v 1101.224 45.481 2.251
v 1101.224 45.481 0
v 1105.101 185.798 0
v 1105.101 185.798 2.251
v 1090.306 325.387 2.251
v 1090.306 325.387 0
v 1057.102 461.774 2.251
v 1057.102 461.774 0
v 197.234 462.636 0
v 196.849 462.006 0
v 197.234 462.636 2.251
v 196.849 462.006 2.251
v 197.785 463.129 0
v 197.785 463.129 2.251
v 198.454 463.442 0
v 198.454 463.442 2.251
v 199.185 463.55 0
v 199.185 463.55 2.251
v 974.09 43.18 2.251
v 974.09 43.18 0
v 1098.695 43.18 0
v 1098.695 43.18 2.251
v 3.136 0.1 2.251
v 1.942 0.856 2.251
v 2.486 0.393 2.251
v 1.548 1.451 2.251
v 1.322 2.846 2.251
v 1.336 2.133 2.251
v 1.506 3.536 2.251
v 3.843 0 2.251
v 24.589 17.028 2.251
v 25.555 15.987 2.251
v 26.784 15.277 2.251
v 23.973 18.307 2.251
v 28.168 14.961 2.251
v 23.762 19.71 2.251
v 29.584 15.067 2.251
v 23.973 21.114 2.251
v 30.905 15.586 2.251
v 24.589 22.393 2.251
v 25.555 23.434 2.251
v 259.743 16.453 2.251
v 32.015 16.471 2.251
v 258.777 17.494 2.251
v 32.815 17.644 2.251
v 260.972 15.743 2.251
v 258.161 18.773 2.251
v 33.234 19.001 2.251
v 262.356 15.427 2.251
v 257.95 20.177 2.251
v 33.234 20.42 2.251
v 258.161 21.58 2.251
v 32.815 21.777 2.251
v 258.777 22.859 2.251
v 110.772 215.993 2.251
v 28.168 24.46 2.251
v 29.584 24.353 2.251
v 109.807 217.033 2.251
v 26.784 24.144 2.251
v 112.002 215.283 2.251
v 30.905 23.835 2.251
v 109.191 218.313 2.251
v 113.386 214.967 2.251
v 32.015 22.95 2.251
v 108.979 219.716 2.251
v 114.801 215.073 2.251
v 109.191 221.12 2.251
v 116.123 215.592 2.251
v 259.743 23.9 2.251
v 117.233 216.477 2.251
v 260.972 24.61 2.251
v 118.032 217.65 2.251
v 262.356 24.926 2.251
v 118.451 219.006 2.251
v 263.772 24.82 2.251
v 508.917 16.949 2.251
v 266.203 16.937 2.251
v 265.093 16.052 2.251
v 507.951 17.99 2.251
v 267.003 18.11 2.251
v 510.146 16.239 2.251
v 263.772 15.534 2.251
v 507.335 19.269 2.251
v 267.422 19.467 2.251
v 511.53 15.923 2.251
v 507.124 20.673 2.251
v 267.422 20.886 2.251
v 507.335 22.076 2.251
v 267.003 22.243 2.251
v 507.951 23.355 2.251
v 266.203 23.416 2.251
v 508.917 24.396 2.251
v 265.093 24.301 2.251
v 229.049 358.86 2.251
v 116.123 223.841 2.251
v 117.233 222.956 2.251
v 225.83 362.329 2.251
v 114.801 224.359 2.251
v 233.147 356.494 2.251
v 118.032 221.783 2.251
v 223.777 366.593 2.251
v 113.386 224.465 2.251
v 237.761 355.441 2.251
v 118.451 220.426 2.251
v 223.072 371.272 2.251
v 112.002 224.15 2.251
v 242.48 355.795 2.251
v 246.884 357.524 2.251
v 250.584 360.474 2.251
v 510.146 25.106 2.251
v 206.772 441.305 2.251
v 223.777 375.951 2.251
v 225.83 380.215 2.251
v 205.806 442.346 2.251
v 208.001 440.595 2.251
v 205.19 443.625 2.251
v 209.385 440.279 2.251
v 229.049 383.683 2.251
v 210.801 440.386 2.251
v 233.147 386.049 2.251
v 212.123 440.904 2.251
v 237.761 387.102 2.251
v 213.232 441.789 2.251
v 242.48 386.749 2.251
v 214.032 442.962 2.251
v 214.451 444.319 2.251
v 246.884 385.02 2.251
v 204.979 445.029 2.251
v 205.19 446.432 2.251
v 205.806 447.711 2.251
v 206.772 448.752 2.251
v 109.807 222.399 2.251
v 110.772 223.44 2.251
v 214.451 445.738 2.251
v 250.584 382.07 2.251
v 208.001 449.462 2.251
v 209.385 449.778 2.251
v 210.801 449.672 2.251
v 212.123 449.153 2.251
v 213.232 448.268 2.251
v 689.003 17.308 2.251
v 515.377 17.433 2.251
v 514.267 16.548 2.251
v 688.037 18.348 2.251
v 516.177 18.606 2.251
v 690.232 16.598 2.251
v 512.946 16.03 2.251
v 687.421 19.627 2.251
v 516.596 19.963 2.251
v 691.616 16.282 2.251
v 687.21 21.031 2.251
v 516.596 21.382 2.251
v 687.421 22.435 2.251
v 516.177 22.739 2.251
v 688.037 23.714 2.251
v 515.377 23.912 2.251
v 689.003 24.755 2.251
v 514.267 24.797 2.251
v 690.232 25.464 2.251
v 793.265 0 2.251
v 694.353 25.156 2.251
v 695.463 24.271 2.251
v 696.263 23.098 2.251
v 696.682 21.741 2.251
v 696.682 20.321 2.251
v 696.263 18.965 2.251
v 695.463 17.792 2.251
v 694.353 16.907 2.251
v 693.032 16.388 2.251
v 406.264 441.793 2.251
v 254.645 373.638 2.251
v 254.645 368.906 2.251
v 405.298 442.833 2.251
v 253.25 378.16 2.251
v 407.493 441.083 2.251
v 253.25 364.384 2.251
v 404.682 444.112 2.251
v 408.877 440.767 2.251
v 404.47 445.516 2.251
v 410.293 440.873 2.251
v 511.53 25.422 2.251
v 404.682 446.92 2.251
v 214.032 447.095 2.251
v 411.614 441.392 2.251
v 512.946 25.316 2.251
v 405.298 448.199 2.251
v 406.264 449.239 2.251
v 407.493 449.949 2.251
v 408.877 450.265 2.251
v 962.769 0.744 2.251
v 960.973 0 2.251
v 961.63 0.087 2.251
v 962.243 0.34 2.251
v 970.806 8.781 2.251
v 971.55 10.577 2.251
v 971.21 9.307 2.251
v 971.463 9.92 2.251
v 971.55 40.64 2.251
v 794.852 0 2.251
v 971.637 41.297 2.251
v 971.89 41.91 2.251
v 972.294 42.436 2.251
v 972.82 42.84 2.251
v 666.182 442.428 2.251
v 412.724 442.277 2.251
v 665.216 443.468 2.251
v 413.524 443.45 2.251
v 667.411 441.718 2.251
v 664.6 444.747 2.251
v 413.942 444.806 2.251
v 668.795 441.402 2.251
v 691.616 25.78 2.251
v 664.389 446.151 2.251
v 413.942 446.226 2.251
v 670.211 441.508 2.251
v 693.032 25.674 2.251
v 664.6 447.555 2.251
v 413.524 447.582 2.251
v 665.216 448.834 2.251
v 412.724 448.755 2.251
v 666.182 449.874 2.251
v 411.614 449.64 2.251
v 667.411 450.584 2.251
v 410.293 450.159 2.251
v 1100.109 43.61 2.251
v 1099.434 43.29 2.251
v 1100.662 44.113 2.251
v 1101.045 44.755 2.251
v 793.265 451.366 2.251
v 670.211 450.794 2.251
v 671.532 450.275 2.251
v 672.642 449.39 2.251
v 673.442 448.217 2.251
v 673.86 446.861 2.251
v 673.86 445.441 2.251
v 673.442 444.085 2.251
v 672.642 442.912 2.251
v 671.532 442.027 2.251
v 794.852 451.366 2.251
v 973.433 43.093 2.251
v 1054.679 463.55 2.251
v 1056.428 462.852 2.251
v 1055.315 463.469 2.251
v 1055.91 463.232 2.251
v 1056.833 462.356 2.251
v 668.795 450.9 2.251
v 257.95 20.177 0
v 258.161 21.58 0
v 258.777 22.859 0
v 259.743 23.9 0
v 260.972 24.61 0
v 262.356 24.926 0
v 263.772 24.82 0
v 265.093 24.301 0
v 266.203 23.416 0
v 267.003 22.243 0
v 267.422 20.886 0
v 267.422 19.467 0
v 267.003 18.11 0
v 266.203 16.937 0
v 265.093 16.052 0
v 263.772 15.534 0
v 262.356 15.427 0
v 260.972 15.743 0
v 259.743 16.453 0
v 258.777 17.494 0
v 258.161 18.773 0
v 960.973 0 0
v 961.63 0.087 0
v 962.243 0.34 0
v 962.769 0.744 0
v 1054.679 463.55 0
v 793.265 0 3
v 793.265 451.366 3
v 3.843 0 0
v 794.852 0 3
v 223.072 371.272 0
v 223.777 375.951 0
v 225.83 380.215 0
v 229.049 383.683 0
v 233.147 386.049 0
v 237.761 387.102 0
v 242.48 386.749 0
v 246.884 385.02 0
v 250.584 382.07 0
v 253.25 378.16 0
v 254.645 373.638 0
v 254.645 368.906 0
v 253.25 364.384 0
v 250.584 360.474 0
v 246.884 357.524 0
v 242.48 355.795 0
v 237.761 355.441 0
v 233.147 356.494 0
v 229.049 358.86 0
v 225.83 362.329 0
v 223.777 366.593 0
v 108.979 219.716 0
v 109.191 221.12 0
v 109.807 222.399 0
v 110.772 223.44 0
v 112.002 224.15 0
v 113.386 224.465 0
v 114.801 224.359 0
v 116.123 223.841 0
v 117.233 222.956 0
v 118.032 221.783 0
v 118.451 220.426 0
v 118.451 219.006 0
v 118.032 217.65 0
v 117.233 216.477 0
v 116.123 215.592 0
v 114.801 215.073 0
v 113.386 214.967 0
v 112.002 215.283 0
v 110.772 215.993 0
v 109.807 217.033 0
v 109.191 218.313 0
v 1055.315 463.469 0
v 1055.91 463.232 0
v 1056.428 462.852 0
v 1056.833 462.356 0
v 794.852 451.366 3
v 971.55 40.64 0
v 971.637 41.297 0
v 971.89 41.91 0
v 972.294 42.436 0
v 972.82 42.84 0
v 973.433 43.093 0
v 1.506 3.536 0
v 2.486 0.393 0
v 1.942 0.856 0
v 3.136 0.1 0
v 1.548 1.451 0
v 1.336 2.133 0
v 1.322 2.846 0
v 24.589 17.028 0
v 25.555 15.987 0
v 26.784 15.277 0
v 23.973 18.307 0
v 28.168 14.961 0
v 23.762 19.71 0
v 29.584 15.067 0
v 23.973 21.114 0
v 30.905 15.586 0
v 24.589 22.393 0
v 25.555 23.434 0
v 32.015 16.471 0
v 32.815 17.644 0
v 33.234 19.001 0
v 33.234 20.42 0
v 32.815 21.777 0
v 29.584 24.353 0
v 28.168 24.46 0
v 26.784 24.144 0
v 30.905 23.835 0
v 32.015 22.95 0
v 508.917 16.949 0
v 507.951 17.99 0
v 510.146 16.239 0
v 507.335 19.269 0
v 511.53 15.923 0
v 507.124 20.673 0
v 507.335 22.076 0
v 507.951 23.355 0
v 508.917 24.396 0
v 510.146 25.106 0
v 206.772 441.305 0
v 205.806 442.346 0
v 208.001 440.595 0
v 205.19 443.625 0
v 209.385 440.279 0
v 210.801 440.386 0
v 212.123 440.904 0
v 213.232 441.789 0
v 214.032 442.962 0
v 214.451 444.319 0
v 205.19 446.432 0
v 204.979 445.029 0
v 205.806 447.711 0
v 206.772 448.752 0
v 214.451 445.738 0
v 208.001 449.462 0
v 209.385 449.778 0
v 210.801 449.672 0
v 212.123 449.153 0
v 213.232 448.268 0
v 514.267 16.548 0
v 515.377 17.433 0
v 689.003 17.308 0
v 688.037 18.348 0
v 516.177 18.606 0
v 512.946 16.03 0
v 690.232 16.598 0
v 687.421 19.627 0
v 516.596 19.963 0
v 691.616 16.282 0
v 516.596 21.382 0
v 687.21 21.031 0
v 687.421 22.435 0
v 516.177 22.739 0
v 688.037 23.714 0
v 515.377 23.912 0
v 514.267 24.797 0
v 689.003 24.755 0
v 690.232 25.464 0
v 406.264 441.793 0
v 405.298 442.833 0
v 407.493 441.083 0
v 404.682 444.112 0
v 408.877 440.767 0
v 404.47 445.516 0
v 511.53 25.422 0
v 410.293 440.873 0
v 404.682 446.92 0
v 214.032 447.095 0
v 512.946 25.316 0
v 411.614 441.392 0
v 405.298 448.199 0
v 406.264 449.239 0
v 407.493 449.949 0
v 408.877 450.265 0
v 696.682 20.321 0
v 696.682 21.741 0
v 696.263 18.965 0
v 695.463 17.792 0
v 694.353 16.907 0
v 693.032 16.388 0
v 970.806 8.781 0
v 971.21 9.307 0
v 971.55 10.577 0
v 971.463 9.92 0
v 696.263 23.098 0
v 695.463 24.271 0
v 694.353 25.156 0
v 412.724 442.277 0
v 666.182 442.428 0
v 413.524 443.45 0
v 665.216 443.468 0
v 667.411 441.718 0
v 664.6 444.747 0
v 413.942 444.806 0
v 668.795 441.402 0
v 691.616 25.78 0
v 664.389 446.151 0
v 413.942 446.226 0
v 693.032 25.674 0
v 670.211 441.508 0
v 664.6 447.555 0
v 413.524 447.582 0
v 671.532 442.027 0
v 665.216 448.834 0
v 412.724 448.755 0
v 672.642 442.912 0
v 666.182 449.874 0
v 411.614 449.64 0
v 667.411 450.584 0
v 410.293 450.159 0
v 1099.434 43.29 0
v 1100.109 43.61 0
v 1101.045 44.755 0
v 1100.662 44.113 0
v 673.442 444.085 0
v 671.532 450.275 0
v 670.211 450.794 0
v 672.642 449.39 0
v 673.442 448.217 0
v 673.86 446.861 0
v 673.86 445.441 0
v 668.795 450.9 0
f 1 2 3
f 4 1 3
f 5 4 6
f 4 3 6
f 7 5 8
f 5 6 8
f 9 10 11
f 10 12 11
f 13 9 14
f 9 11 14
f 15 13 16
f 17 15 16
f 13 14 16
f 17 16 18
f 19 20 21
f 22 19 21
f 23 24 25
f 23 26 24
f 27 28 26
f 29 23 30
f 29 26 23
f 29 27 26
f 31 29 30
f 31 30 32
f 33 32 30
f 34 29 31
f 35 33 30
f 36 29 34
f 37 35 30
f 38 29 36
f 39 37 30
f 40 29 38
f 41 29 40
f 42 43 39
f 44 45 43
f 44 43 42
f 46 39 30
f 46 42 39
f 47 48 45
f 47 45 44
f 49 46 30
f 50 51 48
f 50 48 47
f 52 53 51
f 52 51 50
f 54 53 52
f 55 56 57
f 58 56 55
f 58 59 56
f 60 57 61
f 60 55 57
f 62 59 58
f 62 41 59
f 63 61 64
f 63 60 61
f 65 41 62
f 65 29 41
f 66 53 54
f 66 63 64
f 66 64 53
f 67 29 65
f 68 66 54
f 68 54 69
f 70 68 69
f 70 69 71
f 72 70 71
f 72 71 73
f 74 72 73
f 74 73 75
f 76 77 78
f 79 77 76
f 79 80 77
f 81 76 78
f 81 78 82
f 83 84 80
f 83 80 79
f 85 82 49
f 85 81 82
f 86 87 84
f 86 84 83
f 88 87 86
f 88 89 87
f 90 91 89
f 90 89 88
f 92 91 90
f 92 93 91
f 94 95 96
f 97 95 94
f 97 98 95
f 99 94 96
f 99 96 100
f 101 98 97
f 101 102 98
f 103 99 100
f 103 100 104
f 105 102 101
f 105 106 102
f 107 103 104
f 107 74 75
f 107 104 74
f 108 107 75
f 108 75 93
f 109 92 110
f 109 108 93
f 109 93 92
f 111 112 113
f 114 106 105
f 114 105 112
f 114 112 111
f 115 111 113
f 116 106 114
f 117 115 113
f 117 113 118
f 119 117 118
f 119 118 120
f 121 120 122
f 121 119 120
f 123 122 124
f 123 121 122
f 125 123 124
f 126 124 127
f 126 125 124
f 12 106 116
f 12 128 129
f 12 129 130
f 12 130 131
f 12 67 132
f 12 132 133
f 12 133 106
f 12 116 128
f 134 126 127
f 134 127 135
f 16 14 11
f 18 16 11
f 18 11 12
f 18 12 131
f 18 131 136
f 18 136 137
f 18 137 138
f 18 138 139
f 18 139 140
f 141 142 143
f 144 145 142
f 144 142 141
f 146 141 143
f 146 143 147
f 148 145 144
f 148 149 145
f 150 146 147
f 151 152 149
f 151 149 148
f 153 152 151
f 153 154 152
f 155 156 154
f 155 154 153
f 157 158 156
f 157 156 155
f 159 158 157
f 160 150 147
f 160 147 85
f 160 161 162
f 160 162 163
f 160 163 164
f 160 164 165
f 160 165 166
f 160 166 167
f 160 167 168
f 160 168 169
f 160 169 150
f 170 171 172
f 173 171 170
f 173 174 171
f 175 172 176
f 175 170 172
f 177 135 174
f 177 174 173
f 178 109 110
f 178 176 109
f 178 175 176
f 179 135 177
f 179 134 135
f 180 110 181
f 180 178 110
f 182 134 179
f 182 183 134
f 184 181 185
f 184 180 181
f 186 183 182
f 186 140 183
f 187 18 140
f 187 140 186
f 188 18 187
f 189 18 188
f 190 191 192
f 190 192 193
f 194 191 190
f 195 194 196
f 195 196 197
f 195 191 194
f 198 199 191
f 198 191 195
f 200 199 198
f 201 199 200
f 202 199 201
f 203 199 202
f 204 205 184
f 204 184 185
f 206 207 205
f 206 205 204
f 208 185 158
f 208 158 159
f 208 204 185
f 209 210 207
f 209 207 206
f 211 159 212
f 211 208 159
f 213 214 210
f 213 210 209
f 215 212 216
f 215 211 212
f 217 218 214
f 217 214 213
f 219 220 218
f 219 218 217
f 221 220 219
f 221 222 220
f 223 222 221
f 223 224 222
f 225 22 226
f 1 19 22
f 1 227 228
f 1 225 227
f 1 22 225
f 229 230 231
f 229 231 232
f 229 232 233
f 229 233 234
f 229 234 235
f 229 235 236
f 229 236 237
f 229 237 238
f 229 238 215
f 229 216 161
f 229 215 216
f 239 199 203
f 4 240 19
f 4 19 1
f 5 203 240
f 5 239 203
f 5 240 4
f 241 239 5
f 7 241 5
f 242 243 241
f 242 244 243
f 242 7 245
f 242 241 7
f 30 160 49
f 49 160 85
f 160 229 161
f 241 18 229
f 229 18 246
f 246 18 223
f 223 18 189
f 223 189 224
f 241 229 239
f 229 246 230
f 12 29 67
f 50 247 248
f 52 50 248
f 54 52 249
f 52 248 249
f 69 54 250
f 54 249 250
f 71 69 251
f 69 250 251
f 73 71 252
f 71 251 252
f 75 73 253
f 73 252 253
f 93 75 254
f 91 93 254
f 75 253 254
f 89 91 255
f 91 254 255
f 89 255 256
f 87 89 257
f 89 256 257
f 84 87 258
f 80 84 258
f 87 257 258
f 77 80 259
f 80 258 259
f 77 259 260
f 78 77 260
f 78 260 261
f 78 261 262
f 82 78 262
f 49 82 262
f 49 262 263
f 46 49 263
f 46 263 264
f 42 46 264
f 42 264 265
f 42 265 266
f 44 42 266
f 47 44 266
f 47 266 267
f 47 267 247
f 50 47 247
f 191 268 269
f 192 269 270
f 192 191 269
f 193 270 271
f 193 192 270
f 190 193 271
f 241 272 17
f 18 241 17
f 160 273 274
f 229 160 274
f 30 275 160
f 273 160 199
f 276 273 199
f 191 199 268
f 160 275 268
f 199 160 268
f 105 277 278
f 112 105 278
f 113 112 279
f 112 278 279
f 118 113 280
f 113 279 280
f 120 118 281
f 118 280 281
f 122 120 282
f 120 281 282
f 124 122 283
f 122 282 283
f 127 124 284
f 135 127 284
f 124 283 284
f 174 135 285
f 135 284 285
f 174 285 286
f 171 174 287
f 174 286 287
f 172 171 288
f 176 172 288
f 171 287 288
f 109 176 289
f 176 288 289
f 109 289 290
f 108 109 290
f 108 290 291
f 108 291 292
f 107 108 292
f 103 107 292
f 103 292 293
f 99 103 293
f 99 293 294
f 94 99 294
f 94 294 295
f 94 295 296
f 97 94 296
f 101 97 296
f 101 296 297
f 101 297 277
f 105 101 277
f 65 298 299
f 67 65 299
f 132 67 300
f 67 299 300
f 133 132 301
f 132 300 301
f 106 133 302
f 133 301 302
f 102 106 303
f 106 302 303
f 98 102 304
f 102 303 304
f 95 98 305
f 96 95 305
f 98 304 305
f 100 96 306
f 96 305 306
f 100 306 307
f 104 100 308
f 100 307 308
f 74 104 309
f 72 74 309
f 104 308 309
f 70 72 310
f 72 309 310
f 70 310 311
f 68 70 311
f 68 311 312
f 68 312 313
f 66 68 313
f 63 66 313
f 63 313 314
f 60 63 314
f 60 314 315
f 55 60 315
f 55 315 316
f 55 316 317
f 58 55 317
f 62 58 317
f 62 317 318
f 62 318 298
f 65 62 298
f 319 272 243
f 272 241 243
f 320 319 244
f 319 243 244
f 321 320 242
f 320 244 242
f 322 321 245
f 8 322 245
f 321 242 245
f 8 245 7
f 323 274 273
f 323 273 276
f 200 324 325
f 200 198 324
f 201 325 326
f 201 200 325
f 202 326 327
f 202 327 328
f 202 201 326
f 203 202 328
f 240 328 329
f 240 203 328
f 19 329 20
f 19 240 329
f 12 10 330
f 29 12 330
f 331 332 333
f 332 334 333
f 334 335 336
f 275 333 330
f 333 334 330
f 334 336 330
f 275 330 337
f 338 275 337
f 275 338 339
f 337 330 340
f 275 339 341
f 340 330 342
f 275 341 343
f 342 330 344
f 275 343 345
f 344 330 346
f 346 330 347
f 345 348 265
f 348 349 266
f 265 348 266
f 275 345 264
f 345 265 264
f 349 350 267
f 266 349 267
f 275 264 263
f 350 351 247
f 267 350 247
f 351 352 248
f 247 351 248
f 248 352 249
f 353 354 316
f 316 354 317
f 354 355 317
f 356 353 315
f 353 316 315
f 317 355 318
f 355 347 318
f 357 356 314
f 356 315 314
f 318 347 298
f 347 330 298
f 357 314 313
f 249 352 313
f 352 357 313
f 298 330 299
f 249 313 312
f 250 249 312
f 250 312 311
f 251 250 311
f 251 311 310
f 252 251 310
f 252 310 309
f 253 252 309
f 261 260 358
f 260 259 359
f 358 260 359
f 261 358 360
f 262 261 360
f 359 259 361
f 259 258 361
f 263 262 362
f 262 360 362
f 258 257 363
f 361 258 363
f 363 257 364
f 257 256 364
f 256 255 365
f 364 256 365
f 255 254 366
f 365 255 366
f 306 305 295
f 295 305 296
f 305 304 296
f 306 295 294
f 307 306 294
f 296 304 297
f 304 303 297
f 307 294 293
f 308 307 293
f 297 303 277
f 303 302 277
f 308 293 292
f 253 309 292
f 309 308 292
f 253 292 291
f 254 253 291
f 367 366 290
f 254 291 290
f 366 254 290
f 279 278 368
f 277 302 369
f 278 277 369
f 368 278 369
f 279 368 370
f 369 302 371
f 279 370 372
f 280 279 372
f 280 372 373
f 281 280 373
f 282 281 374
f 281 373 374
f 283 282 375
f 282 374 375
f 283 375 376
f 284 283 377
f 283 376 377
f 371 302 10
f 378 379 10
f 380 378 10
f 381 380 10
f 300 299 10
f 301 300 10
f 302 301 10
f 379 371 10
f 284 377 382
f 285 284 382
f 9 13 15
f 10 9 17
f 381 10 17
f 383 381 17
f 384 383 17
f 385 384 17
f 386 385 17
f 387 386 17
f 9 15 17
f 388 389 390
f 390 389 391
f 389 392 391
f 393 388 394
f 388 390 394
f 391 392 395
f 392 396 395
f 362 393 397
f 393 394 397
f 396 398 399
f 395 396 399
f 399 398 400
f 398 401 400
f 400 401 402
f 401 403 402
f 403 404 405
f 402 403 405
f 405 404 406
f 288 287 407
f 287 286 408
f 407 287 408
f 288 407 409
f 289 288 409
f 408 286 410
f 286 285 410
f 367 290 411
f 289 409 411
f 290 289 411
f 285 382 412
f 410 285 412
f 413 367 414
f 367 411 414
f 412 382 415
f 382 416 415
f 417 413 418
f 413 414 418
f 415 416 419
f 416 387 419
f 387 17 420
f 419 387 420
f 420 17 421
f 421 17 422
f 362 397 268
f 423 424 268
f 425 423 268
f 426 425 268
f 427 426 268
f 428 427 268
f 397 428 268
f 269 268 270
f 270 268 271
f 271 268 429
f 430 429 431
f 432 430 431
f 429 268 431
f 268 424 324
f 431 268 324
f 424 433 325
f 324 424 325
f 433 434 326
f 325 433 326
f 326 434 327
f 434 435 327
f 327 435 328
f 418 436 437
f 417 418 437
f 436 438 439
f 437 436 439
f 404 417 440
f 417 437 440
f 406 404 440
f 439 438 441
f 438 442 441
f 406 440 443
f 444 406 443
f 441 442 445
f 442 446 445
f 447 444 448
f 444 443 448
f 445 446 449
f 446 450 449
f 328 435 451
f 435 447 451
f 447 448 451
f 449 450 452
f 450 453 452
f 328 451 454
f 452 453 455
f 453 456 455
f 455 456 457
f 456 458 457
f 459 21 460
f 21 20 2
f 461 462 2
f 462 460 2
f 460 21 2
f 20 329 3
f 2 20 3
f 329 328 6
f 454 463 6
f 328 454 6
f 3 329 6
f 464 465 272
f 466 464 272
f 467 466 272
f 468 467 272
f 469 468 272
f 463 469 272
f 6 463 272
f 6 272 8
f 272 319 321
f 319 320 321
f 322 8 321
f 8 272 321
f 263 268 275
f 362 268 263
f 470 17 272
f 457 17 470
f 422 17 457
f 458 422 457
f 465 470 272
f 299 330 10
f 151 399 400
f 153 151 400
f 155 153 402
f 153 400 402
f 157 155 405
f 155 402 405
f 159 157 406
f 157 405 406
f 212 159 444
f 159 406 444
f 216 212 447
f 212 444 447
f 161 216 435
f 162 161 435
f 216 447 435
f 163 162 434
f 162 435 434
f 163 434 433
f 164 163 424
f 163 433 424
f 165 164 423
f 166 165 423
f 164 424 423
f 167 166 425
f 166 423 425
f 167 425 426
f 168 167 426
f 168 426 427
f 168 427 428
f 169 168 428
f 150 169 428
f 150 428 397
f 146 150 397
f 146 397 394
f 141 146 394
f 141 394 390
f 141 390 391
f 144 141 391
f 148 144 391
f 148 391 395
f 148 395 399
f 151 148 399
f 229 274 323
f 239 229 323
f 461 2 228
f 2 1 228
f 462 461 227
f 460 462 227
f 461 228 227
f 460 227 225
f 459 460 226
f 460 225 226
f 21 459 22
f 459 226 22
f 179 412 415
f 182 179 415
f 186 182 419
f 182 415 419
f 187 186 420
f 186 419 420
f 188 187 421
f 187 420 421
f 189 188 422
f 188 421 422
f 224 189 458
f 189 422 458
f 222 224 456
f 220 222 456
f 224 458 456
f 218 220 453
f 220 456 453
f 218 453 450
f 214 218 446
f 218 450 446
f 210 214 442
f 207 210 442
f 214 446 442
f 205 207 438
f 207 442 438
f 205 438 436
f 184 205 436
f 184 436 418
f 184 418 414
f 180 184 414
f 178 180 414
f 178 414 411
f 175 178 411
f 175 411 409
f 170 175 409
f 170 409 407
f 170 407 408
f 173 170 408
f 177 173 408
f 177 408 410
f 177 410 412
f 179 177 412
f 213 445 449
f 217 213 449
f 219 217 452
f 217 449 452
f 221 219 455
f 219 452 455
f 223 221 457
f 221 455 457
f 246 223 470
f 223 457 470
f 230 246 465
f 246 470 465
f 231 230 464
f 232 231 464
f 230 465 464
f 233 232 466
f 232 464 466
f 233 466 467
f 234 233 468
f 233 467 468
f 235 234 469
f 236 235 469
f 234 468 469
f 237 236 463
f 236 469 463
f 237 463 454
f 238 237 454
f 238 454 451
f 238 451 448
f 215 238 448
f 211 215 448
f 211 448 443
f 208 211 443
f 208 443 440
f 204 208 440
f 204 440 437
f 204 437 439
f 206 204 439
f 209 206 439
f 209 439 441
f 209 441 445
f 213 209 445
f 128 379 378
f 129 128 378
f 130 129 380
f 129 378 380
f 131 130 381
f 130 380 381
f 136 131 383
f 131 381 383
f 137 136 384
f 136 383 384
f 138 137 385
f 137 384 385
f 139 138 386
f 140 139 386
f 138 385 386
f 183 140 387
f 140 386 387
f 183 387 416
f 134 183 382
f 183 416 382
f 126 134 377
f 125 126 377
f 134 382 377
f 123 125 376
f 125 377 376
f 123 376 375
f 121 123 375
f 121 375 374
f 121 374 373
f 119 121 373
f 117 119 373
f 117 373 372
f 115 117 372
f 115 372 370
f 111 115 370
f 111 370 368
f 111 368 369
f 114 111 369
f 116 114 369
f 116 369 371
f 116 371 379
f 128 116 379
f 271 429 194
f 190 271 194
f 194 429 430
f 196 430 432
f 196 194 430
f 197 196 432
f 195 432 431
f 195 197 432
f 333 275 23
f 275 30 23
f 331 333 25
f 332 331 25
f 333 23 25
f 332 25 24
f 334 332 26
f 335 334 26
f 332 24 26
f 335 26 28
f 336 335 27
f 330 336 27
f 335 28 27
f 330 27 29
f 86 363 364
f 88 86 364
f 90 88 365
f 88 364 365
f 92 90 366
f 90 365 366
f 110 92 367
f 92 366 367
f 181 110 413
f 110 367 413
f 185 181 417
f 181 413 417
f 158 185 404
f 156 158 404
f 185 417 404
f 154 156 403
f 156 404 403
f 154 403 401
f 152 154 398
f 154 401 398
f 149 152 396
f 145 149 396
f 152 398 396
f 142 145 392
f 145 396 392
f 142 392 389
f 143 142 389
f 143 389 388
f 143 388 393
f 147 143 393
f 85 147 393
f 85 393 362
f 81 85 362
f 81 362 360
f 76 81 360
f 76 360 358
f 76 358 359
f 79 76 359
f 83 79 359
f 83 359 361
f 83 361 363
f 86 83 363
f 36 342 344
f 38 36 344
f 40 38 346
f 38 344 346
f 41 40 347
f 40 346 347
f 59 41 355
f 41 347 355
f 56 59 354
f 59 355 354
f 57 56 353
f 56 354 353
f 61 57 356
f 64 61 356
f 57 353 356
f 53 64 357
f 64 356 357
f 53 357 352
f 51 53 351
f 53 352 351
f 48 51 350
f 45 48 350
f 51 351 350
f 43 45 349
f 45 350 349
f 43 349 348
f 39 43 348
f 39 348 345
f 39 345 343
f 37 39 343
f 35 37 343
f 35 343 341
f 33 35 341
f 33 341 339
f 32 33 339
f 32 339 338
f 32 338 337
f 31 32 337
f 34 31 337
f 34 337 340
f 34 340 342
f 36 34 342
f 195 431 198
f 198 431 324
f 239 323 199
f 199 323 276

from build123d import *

# Parameters (mm, degrees)
F1_DEPTH = 3
F2_SIZE  = 9.525
F4_DEPTH = 0.7493
F6_D     = 9.525
F8_D     = 31.75
F9_R     = 2.54


# Not quite as in the source:
# - a length typed as a fraction of an inch, garbled in the dataset ("3 / 203.2 mm" for 3/8 in), is restored


with BuildPart() as f1:
    # F0 (on Top) → F1 (new body)
    with BuildSketch(Plane.XY):
        with BuildLine():
            Line((197.5066929404, 463.55), (0, 0))
            Line((0, 0), (971.55, 0))
            Line((971.55, 0), (971.55, 43.18))
            Line((971.55, 43.18), (1101.00364, 43.18))
            ThreePointArc((1101.00364, 43.18), (1100.0520555905, 255.6158899642), (1056.5397729404, 463.55))
            Line((1056.5397729404, 463.55), (197.5066929404, 463.55))
        make_face()
    extrude(amount=F1_DEPTH)

    # F2
    f2_edges = [f1.edges().sort_by_distance(p)[0] for p in [
        (971.55, 0, 1.5),
    ]]
    chamfer(f2_edges, length=F2_SIZE)

    # F3 (on face) → F4 (cut)
    with BuildSketch(Plane.XY.offset(3)):
        with BuildLine():
            Line((0, 0), (793.26486, 0))
            Line((793.26486, 0), (793.26486, 451.36562))
            Line((793.26486, 451.36562), (794.85236, 451.36562))
            Line((794.85236, 451.36562), (794.85236, 0))
            Line((794.85236, 0), (962.025, 0))
            Line((962.025, 0), (971.55, 9.525))
            Line((971.55, 9.525), (971.55, 43.18))
            Line((971.55, 43.18), (1101.00364, 43.18))
            ThreePointArc((1101.00364, 43.18), (1100.0520555905, 255.6158899642), (1056.5397729404, 463.55))
            Line((1056.5397729404, 463.55), (197.5066929404, 463.55))
            Line((197.5066929404, 463.55), (0, 0))
        make_face()
    extrude(amount=-F4_DEPTH, mode=Mode.SUBTRACT)

    # F6 (through all)
    with Locations(Plane.XY.offset(2.2507)):
        with Locations((209.7413209615, 445.0286267957), (409.2329209615, 445.516), (669.1511209615, 446.151), (113.7415553228, 219.7163059861), (28.5242, 19.7104), (262.7122, 20.176624196), (511.8862, 20.6726826953), (691.9722, 21.0312)):
            Hole(F6_D / 2)

    # F8 (through all)
    with Locations(Plane.XY.offset(2.2507)):
        with Locations((238.9469804498, 371.2718)):
            Hole(F8_D / 2)

    # F9
    f9_edges = [f1.edges().sort_by_distance(p)[0] for p in [
        (197.506693, 463.55, 1.12535),
        (1056.539773, 463.55, 1.12535),
        (1101.00364, 43.18, 1.12535),
        (971.55, 43.18, 1.12535),
        (971.55, 9.525, 1.12535),
        (962.025, 0, 1.12535),
        (0, 0, 1.12535),
    ]]
    fillet(f9_edges, radius=F9_R)


solid = f1.part
